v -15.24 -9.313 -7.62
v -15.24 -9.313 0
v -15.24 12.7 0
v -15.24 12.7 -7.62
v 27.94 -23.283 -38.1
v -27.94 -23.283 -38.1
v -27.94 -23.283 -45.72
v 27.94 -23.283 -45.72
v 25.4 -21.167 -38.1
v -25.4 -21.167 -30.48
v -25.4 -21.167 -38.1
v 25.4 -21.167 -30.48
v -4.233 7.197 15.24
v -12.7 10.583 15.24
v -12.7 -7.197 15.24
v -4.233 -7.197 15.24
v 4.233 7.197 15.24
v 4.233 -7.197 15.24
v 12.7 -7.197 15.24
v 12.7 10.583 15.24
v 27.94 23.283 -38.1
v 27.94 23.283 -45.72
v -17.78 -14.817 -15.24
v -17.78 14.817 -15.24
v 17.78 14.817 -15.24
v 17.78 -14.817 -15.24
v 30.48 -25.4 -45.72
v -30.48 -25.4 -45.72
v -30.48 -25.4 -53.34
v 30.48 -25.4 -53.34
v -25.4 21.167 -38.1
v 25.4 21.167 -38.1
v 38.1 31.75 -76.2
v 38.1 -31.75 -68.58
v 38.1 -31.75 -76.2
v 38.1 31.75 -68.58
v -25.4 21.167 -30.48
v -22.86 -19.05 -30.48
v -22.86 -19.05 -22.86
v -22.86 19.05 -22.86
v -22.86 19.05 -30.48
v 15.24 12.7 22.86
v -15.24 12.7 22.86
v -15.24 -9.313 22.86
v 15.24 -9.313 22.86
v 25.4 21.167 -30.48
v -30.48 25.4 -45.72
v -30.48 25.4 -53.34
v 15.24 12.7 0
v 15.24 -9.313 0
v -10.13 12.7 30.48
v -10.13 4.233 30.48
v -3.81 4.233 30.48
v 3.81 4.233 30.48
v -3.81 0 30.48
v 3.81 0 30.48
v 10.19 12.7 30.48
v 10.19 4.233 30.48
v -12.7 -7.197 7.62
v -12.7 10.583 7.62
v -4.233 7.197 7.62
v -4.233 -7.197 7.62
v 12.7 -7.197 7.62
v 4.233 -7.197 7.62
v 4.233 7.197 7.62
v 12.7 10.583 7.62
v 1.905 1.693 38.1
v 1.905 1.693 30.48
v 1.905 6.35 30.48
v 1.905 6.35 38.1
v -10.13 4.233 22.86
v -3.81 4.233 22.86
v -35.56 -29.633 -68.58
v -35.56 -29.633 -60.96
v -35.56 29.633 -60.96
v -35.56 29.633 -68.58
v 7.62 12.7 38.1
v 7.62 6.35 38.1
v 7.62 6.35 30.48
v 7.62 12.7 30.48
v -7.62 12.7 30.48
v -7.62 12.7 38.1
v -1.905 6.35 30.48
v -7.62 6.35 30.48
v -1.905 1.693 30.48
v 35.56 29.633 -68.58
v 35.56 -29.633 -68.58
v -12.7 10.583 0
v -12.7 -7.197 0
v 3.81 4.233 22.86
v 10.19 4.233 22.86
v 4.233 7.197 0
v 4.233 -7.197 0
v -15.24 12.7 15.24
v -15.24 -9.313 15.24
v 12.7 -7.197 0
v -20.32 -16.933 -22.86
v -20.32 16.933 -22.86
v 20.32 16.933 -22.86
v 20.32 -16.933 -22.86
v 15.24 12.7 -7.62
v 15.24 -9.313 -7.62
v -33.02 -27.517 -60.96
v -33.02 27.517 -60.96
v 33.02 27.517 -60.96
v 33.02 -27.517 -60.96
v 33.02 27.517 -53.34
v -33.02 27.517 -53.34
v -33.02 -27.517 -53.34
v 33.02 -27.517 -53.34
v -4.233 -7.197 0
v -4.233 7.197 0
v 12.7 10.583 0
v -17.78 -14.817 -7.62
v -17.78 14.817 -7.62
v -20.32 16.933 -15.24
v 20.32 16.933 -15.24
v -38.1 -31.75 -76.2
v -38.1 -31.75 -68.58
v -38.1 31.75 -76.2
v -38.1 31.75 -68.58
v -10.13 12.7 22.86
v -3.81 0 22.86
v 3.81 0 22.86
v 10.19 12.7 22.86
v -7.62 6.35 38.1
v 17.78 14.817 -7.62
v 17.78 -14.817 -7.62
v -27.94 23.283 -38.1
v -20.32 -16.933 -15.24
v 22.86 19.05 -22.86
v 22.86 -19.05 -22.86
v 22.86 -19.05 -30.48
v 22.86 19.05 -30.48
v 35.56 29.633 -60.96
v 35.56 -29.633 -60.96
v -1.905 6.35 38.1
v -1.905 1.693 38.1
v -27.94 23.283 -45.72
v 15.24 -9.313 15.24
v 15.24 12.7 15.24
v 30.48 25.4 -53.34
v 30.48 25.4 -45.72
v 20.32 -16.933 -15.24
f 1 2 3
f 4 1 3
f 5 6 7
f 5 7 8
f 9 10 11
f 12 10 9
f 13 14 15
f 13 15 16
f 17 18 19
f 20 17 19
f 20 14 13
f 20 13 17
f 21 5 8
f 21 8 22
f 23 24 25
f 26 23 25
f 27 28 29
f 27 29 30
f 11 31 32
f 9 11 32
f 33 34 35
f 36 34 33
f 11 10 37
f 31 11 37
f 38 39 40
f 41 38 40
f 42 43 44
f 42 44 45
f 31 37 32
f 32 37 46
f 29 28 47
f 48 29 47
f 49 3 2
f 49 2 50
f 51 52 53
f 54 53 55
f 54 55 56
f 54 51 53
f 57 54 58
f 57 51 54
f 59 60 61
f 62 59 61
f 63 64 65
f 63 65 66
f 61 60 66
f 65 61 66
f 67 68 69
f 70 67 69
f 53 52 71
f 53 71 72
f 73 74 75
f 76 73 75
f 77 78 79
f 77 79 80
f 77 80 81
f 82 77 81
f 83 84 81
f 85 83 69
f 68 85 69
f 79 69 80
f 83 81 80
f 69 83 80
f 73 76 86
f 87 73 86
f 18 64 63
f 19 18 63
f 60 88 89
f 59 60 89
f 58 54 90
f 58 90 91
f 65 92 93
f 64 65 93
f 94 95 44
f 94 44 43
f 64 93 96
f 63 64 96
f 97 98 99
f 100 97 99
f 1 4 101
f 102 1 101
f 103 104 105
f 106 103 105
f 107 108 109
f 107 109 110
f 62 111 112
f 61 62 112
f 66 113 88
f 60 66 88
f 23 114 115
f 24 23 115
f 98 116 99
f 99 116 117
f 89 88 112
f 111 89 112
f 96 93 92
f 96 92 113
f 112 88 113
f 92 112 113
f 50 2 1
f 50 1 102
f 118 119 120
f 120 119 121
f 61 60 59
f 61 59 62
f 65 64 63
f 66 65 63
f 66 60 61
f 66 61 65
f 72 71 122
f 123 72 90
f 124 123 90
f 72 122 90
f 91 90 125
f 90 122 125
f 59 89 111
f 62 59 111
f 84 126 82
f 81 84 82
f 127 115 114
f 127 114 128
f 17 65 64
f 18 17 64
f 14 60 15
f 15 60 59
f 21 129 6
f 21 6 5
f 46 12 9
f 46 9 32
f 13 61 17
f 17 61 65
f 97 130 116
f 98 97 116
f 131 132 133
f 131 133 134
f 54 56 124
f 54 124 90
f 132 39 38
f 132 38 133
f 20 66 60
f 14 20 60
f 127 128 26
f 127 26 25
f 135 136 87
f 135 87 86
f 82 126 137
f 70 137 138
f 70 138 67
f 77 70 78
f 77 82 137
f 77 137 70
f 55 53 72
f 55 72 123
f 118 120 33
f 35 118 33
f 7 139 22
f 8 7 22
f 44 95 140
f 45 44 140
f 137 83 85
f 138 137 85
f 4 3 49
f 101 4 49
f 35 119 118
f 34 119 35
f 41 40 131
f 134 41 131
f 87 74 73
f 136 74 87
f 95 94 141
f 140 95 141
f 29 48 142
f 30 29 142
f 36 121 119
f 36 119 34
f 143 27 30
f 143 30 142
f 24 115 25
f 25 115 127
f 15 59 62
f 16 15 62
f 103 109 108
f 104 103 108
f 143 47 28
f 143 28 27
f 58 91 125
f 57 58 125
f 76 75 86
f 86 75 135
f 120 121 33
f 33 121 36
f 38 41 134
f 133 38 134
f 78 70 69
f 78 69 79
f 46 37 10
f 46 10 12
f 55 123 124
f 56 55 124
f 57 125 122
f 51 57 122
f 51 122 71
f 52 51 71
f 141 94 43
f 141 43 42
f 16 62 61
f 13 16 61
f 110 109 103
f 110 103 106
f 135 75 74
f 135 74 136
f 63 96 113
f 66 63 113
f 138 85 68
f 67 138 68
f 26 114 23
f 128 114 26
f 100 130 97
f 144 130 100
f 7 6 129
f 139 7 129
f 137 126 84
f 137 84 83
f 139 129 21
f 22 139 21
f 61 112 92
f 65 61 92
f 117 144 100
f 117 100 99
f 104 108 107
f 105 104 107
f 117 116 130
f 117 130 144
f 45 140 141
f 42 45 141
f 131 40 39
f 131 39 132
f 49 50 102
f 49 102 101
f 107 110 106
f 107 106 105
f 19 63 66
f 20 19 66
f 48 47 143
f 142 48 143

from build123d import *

# Parameters (mm, degrees)
F1_START  = -68.58
F0_W      = 76.2
F0_H      = 63.5
F0_W_2    = 71.12
F0_H_2    = 59.2666666667
F0_W_3    = 66.04
F0_H_3    = 55.0333333333
F0_W_4    = 60.96
F0_H_4    = 50.8
F0_W_5    = 55.88
F0_H_5    = 46.5666666667
F0_W_6    = 50.8
F0_H_6    = 42.3333333333
F0_W_7    = 45.72
F0_H_7    = 38.1
F0_W_8    = 40.64
F0_H_8    = 33.8666666667
F0_W_9    = 35.56
F0_H_9    = 29.6333333333
F0_W_10   = 30.48
F0_H_10   = 22.0133333333
F0_W_11   = 8.4666666667
F0_H_11   = 14.3933333333
F1_DEPTH  = 7.62
F2_START  = -60.96
F2_DEPTH  = 7.62
F3_START  = -53.34
F3_DEPTH  = 7.62
F4_START  = -45.72
F4_DEPTH  = 7.62
F5_START  = -38.1
F5_DEPTH  = 7.62
F6_START  = -30.48
F6_DEPTH  = 7.62
F7_START  = -22.86
F7_DEPTH  = 7.62
F8_START  = -15.24
F8_DEPTH  = 7.62
F9_START  = -7.62
F9_DEPTH  = 7.62
F10_DEPTH = 7.62
F11_DEPTH = 7.62
F12_START = 15.24
F12_DEPTH = 7.62
F13_W     = 1.905
F13_H     = 2.1166666667
F13_W_2   = 3.81
F13_H_2   = 6.35
F13_H_3   = 2.54
F14_DEPTH = 7.62
F15_START = 7.62
F15_DEPTH = 7.62
F16_START = 7.62
F16_DEPTH = 7.62


# Not quite as in the source:
# - a feature names something its author has since deleted; it is built from what else it names


with BuildPart() as f1:
    # F0 (on Top) → F1 (new body)
    with BuildSketch(Plane.XY.offset(F1_START)):
        Rectangle(F0_W, F0_H)
        Rectangle(F0_W_2, F0_H_2, mode=Mode.SUBTRACT)
        Rectangle(F0_W_2, F0_H_2)
        Rectangle(F0_W_3, F0_H_3, mode=Mode.SUBTRACT)
        Rectangle(F0_W_3, F0_H_3)
        Rectangle(F0_W_4, F0_H_4, mode=Mode.SUBTRACT)
        Rectangle(F0_W_4, F0_H_4)
        Rectangle(F0_W_5, F0_H_5, mode=Mode.SUBTRACT)
        Rectangle(F0_W_5, F0_H_5)
        Rectangle(F0_W_6, F0_H_6, mode=Mode.SUBTRACT)
        Rectangle(F0_W_6, F0_H_6)
        Rectangle(F0_W_7, F0_H_7, mode=Mode.SUBTRACT)
        Rectangle(F0_W_7, F0_H_7)
        Rectangle(F0_W_8, F0_H_8, mode=Mode.SUBTRACT)
        Rectangle(F0_W_8, F0_H_8)
        Rectangle(F0_W_9, F0_H_9, mode=Mode.SUBTRACT)
        Rectangle(F0_W_9, F0_H_9)
        with Locations((0, 1.6933333333)):
            Rectangle(F0_W_10, F0_H_10, mode=Mode.SUBTRACT)
        with Locations((0, 1.6933333333)):
            Rectangle(F0_W_10, F0_H_10)
        Polygon((-12.7, -7.1966666667), (-12.7, 10.5833333333), (12.7, 10.5833333333), (12.7, -7.1966666667), (4.2333333333, -7.1966666667), (-4.2333333333, -7.1966666667), align=None, mode=Mode.SUBTRACT)
        Polygon((12.7, 10.5833333333), (-12.7, 10.5833333333), (-12.7, -7.1966666667), (-4.2333333333, -7.1966666667), (-4.2333333333, 7.1966666667), (4.2333333333, 7.1966666667), (4.2333333333, -7.1966666667), (12.7, -7.1966666667), align=None)
        Rectangle(F0_W_11, F0_H_11)
    extrude(amount=-F1_DEPTH)


with BuildPart() as f2:
    # F0 (on Top) → F2 (new body)
    with BuildSketch(Plane.XY.offset(F2_START)):
        Rectangle(F0_W_2, F0_H_2)
        Rectangle(F0_W_3, F0_H_3, mode=Mode.SUBTRACT)
        Rectangle(F0_W_3, F0_H_3)
        Rectangle(F0_W_4, F0_H_4, mode=Mode.SUBTRACT)
        Rectangle(F0_W_4, F0_H_4)
        Rectangle(F0_W_5, F0_H_5, mode=Mode.SUBTRACT)
        Rectangle(F0_W_5, F0_H_5)
        Rectangle(F0_W_6, F0_H_6, mode=Mode.SUBTRACT)
        Rectangle(F0_W_6, F0_H_6)
        Rectangle(F0_W_7, F0_H_7, mode=Mode.SUBTRACT)
        Rectangle(F0_W_7, F0_H_7)
        Rectangle(F0_W_8, F0_H_8, mode=Mode.SUBTRACT)
        Rectangle(F0_W_8, F0_H_8)
        Rectangle(F0_W_9, F0_H_9, mode=Mode.SUBTRACT)
        Rectangle(F0_W_9, F0_H_9)
        with Locations((0, 1.6933333333)):
            Rectangle(F0_W_10, F0_H_10, mode=Mode.SUBTRACT)
        with Locations((0, 1.6933333333)):
            Rectangle(F0_W_10, F0_H_10)
        Polygon((-12.7, -7.1966666667), (-12.7, 10.5833333333), (12.7, 10.5833333333), (12.7, -7.1966666667), (4.2333333333, -7.1966666667), (-4.2333333333, -7.1966666667), align=None, mode=Mode.SUBTRACT)
        Polygon((12.7, 10.5833333333), (-12.7, 10.5833333333), (-12.7, -7.1966666667), (-4.2333333333, -7.1966666667), (-4.2333333333, 7.1966666667), (4.2333333333, 7.1966666667), (4.2333333333, -7.1966666667), (12.7, -7.1966666667), align=None)
        Rectangle(F0_W_11, F0_H_11)
    extrude(amount=-F2_DEPTH)


with BuildPart() as f3:
    # F0 (on Top) → F3 (new body)
    with BuildSketch(Plane.XY.offset(F3_START)):
        Rectangle(F0_W_3, F0_H_3)
        Rectangle(F0_W_4, F0_H_4, mode=Mode.SUBTRACT)
        Rectangle(F0_W_4, F0_H_4)
        Rectangle(F0_W_5, F0_H_5, mode=Mode.SUBTRACT)
        Rectangle(F0_W_5, F0_H_5)
        Rectangle(F0_W_6, F0_H_6, mode=Mode.SUBTRACT)
        Rectangle(F0_W_6, F0_H_6)
        Rectangle(F0_W_7, F0_H_7, mode=Mode.SUBTRACT)
        Rectangle(F0_W_7, F0_H_7)
        Rectangle(F0_W_8, F0_H_8, mode=Mode.SUBTRACT)
        Rectangle(F0_W_8, F0_H_8)
        Rectangle(F0_W_9, F0_H_9, mode=Mode.SUBTRACT)
        Rectangle(F0_W_9, F0_H_9)
        with Locations((0, 1.6933333333)):
            Rectangle(F0_W_10, F0_H_10, mode=Mode.SUBTRACT)
        with Locations((0, 1.6933333333)):
            Rectangle(F0_W_10, F0_H_10)
        Polygon((-12.7, -7.1966666667), (-12.7, 10.5833333333), (12.7, 10.5833333333), (12.7, -7.1966666667), (4.2333333333, -7.1966666667), (-4.2333333333, -7.1966666667), align=None, mode=Mode.SUBTRACT)
        Polygon((12.7, 10.5833333333), (-12.7, 10.5833333333), (-12.7, -7.1966666667), (-4.2333333333, -7.1966666667), (-4.2333333333, 7.1966666667), (4.2333333333, 7.1966666667), (4.2333333333, -7.1966666667), (12.7, -7.1966666667), align=None)
        Rectangle(F0_W_11, F0_H_11)
    extrude(amount=-F3_DEPTH)


with BuildPart() as f4:
    # F0 (on Top) → F4 (new body)
    with BuildSketch(Plane.XY.offset(F4_START)):
        Rectangle(F0_W_4, F0_H_4)
        Rectangle(F0_W_5, F0_H_5, mode=Mode.SUBTRACT)
        Rectangle(F0_W_5, F0_H_5)
        Rectangle(F0_W_6, F0_H_6, mode=Mode.SUBTRACT)
        Rectangle(F0_W_6, F0_H_6)
        Rectangle(F0_W_7, F0_H_7, mode=Mode.SUBTRACT)
        Rectangle(F0_W_7, F0_H_7)
        Rectangle(F0_W_8, F0_H_8, mode=Mode.SUBTRACT)
        Rectangle(F0_W_8, F0_H_8)
        Rectangle(F0_W_9, F0_H_9, mode=Mode.SUBTRACT)
        Rectangle(F0_W_9, F0_H_9)
        with Locations((0, 1.6933333333)):
            Rectangle(F0_W_10, F0_H_10, mode=Mode.SUBTRACT)
        with Locations((0, 1.6933333333)):
            Rectangle(F0_W_10, F0_H_10)
        Polygon((-12.7, -7.1966666667), (-12.7, 10.5833333333), (12.7, 10.5833333333), (12.7, -7.1966666667), (4.2333333333, -7.1966666667), (-4.2333333333, -7.1966666667), align=None, mode=Mode.SUBTRACT)
        Polygon((12.7, 10.5833333333), (-12.7, 10.5833333333), (-12.7, -7.1966666667), (-4.2333333333, -7.1966666667), (-4.2333333333, 7.1966666667), (4.2333333333, 7.1966666667), (4.2333333333, -7.1966666667), (12.7, -7.1966666667), align=None)
        Rectangle(F0_W_11, F0_H_11)
    extrude(amount=-F4_DEPTH)


with BuildPart() as f5:
    # F0 (on Top) → F5 (new body)
    with BuildSketch(Plane.XY.offset(F5_START)):
        Rectangle(F0_W_5, F0_H_5)
        Rectangle(F0_W_6, F0_H_6, mode=Mode.SUBTRACT)
        Rectangle(F0_W_6, F0_H_6)
        Rectangle(F0_W_7, F0_H_7, mode=Mode.SUBTRACT)
        Rectangle(F0_W_7, F0_H_7)
        Rectangle(F0_W_8, F0_H_8, mode=Mode.SUBTRACT)
        Rectangle(F0_W_8, F0_H_8)
        Rectangle(F0_W_9, F0_H_9, mode=Mode.SUBTRACT)
        Rectangle(F0_W_9, F0_H_9)
        with Locations((0, 1.6933333333)):
            Rectangle(F0_W_10, F0_H_10, mode=Mode.SUBTRACT)
        with Locations((0, 1.6933333333)):
            Rectangle(F0_W_10, F0_H_10)
        Polygon((-12.7, -7.1966666667), (-12.7, 10.5833333333), (12.7, 10.5833333333), (12.7, -7.1966666667), (4.2333333333, -7.1966666667), (-4.2333333333, -7.1966666667), align=None, mode=Mode.SUBTRACT)
        Rectangle(F0_W_11, F0_H_11)
        Polygon((12.7, 10.5833333333), (-12.7, 10.5833333333), (-12.7, -7.1966666667), (-4.2333333333, -7.1966666667), (-4.2333333333, 7.1966666667), (4.2333333333, 7.1966666667), (4.2333333333, -7.1966666667), (12.7, -7.1966666667), align=None)
    extrude(amount=-F5_DEPTH)


with BuildPart() as f6:
    # F0 (on Top) → F6 (new body)
    with BuildSketch(Plane.XY.offset(F6_START)):
        Rectangle(F0_W_6, F0_H_6)
        Rectangle(F0_W_7, F0_H_7, mode=Mode.SUBTRACT)
        Rectangle(F0_W_7, F0_H_7)
        Rectangle(F0_W_8, F0_H_8, mode=Mode.SUBTRACT)
        Rectangle(F0_W_8, F0_H_8)
        Rectangle(F0_W_9, F0_H_9, mode=Mode.SUBTRACT)
        Rectangle(F0_W_9, F0_H_9)
        with Locations((0, 1.6933333333)):
            Rectangle(F0_W_10, F0_H_10, mode=Mode.SUBTRACT)
        with Locations((0, 1.6933333333)):
            Rectangle(F0_W_10, F0_H_10)
        Polygon((-12.7, -7.1966666667), (-12.7, 10.5833333333), (12.7, 10.5833333333), (12.7, -7.1966666667), (4.2333333333, -7.1966666667), (-4.2333333333, -7.1966666667), align=None, mode=Mode.SUBTRACT)
        Polygon((12.7, 10.5833333333), (-12.7, 10.5833333333), (-12.7, -7.1966666667), (-4.2333333333, -7.1966666667), (-4.2333333333, 7.1966666667), (4.2333333333, 7.1966666667), (4.2333333333, -7.1966666667), (12.7, -7.1966666667), align=None)
        Rectangle(F0_W_11, F0_H_11)
    extrude(amount=-F6_DEPTH)


with BuildPart() as f7:
    # F0 (on Top) → F7 (new body)
    with BuildSketch(Plane.XY.offset(F7_START)):
        Rectangle(F0_W_7, F0_H_7)
        Rectangle(F0_W_8, F0_H_8, mode=Mode.SUBTRACT)
        Rectangle(F0_W_8, F0_H_8)
        Rectangle(F0_W_9, F0_H_9, mode=Mode.SUBTRACT)
        Rectangle(F0_W_9, F0_H_9)
        with Locations((0, 1.6933333333)):
            Rectangle(F0_W_10, F0_H_10, mode=Mode.SUBTRACT)
        with Locations((0, 1.6933333333)):
            Rectangle(F0_W_10, F0_H_10)
        Polygon((-12.7, -7.1966666667), (-12.7, 10.5833333333), (12.7, 10.5833333333), (12.7, -7.1966666667), (4.2333333333, -7.1966666667), (-4.2333333333, -7.1966666667), align=None, mode=Mode.SUBTRACT)
        Polygon((12.7, 10.5833333333), (-12.7, 10.5833333333), (-12.7, -7.1966666667), (-4.2333333333, -7.1966666667), (-4.2333333333, 7.1966666667), (4.2333333333, 7.1966666667), (4.2333333333, -7.1966666667), (12.7, -7.1966666667), align=None)
        Rectangle(F0_W_11, F0_H_11)
    extrude(amount=-F7_DEPTH)


with BuildPart() as f8:
    # F0 (on Top) → F8 (new body)
    with BuildSketch(Plane.XY.offset(F8_START)):
        Rectangle(F0_W_8, F0_H_8)
        Rectangle(F0_W_9, F0_H_9, mode=Mode.SUBTRACT)
        Rectangle(F0_W_9, F0_H_9)
        with Locations((0, 1.6933333333)):
            Rectangle(F0_W_10, F0_H_10, mode=Mode.SUBTRACT)
        with Locations((0, 1.6933333333)):
            Rectangle(F0_W_10, F0_H_10)
        Polygon((-12.7, -7.1966666667), (-12.7, 10.5833333333), (12.7, 10.5833333333), (12.7, -7.1966666667), (4.2333333333, -7.1966666667), (-4.2333333333, -7.1966666667), align=None, mode=Mode.SUBTRACT)
        Polygon((12.7, 10.5833333333), (-12.7, 10.5833333333), (-12.7, -7.1966666667), (-4.2333333333, -7.1966666667), (-4.2333333333, 7.1966666667), (4.2333333333, 7.1966666667), (4.2333333333, -7.1966666667), (12.7, -7.1966666667), align=None)
        Rectangle(F0_W_11, F0_H_11)
    extrude(amount=-F8_DEPTH)


with BuildPart() as f9:
    # F0 (on Top) → F9 (new body)
    with BuildSketch(Plane.XY.offset(F9_START)):
        Rectangle(F0_W_9, F0_H_9)
        with Locations((0, 1.6933333333)):
            Rectangle(F0_W_10, F0_H_10, mode=Mode.SUBTRACT)
        with Locations((0, 1.6933333333)):
            Rectangle(F0_W_10, F0_H_10)
        Polygon((-12.7, -7.1966666667), (-12.7, 10.5833333333), (12.7, 10.5833333333), (12.7, -7.1966666667), (4.2333333333, -7.1966666667), (-4.2333333333, -7.1966666667), align=None, mode=Mode.SUBTRACT)
        Polygon((12.7, 10.5833333333), (-12.7, 10.5833333333), (-12.7, -7.1966666667), (-4.2333333333, -7.1966666667), (-4.2333333333, 7.1966666667), (4.2333333333, 7.1966666667), (4.2333333333, -7.1966666667), (12.7, -7.1966666667), align=None)
        Rectangle(F0_W_11, F0_H_11)
    extrude(amount=-F9_DEPTH)


with BuildPart() as f10:
    # F0 (on Top) → F10 (new body)
    with BuildSketch(Plane.XY):
        with Locations((0, 1.6933333333)):
            Rectangle(F0_W_10, F0_H_10)
        Polygon((-12.7, -7.1966666667), (-12.7, 10.5833333333), (12.7, 10.5833333333), (12.7, -7.1966666667), (4.2333333333, -7.1966666667), (-4.2333333333, -7.1966666667), align=None, mode=Mode.SUBTRACT)
        Polygon((12.7, 10.5833333333), (-12.7, 10.5833333333), (-12.7, -7.1966666667), (-4.2333333333, -7.1966666667), (-4.2333333333, 7.1966666667), (4.2333333333, 7.1966666667), (4.2333333333, -7.1966666667), (12.7, -7.1966666667), align=None)
        Rectangle(F0_W_11, F0_H_11)
    extrude(amount=-F10_DEPTH)


with BuildPart() as f11:
    # F0 (on Top) → F11 (new body)
    with BuildSketch(Plane.XY):
        Polygon((12.7, 10.5833333333), (-12.7, 10.5833333333), (-12.7, -7.1966666667), (-4.2333333333, -7.1966666667), (-4.2333333333, 7.1966666667), (4.2333333333, 7.1966666667), (4.2333333333, -7.1966666667), (12.7, -7.1966666667), align=None)
    extrude(amount=F11_DEPTH)


with BuildPart() as f12:
    # F0 (on Top) → F12 (new body)
    with BuildSketch(Plane.XY.offset(F12_START)):
        with Locations((0, 1.6933333333)):
            Rectangle(F0_W_10, F0_H_10)
        Polygon((-12.7, -7.1966666667), (-12.7, 10.5833333333), (12.7, 10.5833333333), (12.7, -7.1966666667), (4.2333333333, -7.1966666667), (-4.2333333333, -7.1966666667), align=None, mode=Mode.SUBTRACT)
        Polygon((12.7, 10.5833333333), (-12.7, 10.5833333333), (-12.7, -7.1966666667), (-4.2333333333, -7.1966666667), (-4.2333333333, 7.1966666667), (4.2333333333, 7.1966666667), (4.2333333333, -7.1966666667), (12.7, -7.1966666667), align=None)
        Rectangle(F0_W_11, F0_H_11)
    extrude(amount=F12_DEPTH)


with BuildPart() as f14:
    # F13 (on face) → F14 (new body)
    with BuildSketch(Plane.XY.offset(22.86)):
        Polygon((-7.62, 12.7), (-10.1297069341, 12.7), (-10.1297069341, 4.2333333333), (-3.81, 4.2333333333), (-3.81, 6.35), (-7.62, 6.35), align=None)
        with Locations((2.8575, 5.2916666667)):
            Rectangle(F13_W, F13_H)
        with Locations((-2.8575, 5.2916666667)):
            Rectangle(F13_W, F13_H)
        Polygon((-1.905, 4.2333333333), (-3.81, 4.2333333333), (-3.81, 0), (3.81, 0), (3.81, 4.2333333333), (1.905, 4.2333333333), (1.905, 1.6933333333), (-1.905, 1.6933333333), align=None)
        Polygon((3.81, 6.35), (3.81, 4.2333333333), (10.1902930659, 4.2333333333), (10.1902930659, 12.7), (7.62, 12.7), (7.62, 6.35), align=None)
        with Locations((5.715, 9.525)):
            Rectangle(F13_W_2, F13_H_2)
        with Locations((2.8575, 9.525)):
            Rectangle(F13_W, F13_H_2)
        with Locations((0, 9.525)):
            Rectangle(F13_W_2, F13_H_2)
        with Locations((0, 5.2916666667)):
            Rectangle(F13_W_2, F13_H)
        with Locations((0, 2.9633333333)):
            Rectangle(F13_W_2, F13_H_3)
        with Locations((-2.8575, 9.525)):
            Rectangle(F13_W, F13_H_2)
        with Locations((-5.715, 9.525)):
            Rectangle(F13_W_2, F13_H_2)
    extrude(amount=F14_DEPTH)


with BuildPart() as f15:
    # F13 (on face) → F15 (new body)
    with BuildSketch(Plane.XY.offset(22.86).offset(F15_START)):
        with Locations((-5.715, 9.525)):
            Rectangle(F13_W_2, F13_H_2)
        with Locations((-2.8575, 9.525)):
            Rectangle(F13_W, F13_H_2)
        with Locations((0, 9.525)):
            Rectangle(F13_W_2, F13_H_2)
        with Locations((2.8575, 9.525)):
            Rectangle(F13_W, F13_H_2)
        with Locations((5.715, 9.525)):
            Rectangle(F13_W_2, F13_H_2)
        with Locations((0, 5.2916666667)):
            Rectangle(F13_W_2, F13_H)
        with Locations((0, 2.9633333333)):
            Rectangle(F13_W_2, F13_H_3)
    extrude(amount=F15_DEPTH)


with BuildPart() as f16:
    # F0 (on Top) → F16 (new body)
    with BuildSketch(Plane.XY.offset(F16_START)):
        Polygon((12.7, 10.5833333333), (-12.7, 10.5833333333), (-12.7, -7.1966666667), (-4.2333333333, -7.1966666667), (-4.2333333333, 7.1966666667), (4.2333333333, 7.1966666667), (4.2333333333, -7.1966666667), (12.7, -7.1966666667), align=None)
    extrude(amount=F16_DEPTH)


solid = Compound([f1.part, f2.part, f3.part, f4.part, f5.part, f6.part, f7.part, f8.part, f9.part, f10.part, f11.part, f12.part, f14.part, f15.part, f16.part])
